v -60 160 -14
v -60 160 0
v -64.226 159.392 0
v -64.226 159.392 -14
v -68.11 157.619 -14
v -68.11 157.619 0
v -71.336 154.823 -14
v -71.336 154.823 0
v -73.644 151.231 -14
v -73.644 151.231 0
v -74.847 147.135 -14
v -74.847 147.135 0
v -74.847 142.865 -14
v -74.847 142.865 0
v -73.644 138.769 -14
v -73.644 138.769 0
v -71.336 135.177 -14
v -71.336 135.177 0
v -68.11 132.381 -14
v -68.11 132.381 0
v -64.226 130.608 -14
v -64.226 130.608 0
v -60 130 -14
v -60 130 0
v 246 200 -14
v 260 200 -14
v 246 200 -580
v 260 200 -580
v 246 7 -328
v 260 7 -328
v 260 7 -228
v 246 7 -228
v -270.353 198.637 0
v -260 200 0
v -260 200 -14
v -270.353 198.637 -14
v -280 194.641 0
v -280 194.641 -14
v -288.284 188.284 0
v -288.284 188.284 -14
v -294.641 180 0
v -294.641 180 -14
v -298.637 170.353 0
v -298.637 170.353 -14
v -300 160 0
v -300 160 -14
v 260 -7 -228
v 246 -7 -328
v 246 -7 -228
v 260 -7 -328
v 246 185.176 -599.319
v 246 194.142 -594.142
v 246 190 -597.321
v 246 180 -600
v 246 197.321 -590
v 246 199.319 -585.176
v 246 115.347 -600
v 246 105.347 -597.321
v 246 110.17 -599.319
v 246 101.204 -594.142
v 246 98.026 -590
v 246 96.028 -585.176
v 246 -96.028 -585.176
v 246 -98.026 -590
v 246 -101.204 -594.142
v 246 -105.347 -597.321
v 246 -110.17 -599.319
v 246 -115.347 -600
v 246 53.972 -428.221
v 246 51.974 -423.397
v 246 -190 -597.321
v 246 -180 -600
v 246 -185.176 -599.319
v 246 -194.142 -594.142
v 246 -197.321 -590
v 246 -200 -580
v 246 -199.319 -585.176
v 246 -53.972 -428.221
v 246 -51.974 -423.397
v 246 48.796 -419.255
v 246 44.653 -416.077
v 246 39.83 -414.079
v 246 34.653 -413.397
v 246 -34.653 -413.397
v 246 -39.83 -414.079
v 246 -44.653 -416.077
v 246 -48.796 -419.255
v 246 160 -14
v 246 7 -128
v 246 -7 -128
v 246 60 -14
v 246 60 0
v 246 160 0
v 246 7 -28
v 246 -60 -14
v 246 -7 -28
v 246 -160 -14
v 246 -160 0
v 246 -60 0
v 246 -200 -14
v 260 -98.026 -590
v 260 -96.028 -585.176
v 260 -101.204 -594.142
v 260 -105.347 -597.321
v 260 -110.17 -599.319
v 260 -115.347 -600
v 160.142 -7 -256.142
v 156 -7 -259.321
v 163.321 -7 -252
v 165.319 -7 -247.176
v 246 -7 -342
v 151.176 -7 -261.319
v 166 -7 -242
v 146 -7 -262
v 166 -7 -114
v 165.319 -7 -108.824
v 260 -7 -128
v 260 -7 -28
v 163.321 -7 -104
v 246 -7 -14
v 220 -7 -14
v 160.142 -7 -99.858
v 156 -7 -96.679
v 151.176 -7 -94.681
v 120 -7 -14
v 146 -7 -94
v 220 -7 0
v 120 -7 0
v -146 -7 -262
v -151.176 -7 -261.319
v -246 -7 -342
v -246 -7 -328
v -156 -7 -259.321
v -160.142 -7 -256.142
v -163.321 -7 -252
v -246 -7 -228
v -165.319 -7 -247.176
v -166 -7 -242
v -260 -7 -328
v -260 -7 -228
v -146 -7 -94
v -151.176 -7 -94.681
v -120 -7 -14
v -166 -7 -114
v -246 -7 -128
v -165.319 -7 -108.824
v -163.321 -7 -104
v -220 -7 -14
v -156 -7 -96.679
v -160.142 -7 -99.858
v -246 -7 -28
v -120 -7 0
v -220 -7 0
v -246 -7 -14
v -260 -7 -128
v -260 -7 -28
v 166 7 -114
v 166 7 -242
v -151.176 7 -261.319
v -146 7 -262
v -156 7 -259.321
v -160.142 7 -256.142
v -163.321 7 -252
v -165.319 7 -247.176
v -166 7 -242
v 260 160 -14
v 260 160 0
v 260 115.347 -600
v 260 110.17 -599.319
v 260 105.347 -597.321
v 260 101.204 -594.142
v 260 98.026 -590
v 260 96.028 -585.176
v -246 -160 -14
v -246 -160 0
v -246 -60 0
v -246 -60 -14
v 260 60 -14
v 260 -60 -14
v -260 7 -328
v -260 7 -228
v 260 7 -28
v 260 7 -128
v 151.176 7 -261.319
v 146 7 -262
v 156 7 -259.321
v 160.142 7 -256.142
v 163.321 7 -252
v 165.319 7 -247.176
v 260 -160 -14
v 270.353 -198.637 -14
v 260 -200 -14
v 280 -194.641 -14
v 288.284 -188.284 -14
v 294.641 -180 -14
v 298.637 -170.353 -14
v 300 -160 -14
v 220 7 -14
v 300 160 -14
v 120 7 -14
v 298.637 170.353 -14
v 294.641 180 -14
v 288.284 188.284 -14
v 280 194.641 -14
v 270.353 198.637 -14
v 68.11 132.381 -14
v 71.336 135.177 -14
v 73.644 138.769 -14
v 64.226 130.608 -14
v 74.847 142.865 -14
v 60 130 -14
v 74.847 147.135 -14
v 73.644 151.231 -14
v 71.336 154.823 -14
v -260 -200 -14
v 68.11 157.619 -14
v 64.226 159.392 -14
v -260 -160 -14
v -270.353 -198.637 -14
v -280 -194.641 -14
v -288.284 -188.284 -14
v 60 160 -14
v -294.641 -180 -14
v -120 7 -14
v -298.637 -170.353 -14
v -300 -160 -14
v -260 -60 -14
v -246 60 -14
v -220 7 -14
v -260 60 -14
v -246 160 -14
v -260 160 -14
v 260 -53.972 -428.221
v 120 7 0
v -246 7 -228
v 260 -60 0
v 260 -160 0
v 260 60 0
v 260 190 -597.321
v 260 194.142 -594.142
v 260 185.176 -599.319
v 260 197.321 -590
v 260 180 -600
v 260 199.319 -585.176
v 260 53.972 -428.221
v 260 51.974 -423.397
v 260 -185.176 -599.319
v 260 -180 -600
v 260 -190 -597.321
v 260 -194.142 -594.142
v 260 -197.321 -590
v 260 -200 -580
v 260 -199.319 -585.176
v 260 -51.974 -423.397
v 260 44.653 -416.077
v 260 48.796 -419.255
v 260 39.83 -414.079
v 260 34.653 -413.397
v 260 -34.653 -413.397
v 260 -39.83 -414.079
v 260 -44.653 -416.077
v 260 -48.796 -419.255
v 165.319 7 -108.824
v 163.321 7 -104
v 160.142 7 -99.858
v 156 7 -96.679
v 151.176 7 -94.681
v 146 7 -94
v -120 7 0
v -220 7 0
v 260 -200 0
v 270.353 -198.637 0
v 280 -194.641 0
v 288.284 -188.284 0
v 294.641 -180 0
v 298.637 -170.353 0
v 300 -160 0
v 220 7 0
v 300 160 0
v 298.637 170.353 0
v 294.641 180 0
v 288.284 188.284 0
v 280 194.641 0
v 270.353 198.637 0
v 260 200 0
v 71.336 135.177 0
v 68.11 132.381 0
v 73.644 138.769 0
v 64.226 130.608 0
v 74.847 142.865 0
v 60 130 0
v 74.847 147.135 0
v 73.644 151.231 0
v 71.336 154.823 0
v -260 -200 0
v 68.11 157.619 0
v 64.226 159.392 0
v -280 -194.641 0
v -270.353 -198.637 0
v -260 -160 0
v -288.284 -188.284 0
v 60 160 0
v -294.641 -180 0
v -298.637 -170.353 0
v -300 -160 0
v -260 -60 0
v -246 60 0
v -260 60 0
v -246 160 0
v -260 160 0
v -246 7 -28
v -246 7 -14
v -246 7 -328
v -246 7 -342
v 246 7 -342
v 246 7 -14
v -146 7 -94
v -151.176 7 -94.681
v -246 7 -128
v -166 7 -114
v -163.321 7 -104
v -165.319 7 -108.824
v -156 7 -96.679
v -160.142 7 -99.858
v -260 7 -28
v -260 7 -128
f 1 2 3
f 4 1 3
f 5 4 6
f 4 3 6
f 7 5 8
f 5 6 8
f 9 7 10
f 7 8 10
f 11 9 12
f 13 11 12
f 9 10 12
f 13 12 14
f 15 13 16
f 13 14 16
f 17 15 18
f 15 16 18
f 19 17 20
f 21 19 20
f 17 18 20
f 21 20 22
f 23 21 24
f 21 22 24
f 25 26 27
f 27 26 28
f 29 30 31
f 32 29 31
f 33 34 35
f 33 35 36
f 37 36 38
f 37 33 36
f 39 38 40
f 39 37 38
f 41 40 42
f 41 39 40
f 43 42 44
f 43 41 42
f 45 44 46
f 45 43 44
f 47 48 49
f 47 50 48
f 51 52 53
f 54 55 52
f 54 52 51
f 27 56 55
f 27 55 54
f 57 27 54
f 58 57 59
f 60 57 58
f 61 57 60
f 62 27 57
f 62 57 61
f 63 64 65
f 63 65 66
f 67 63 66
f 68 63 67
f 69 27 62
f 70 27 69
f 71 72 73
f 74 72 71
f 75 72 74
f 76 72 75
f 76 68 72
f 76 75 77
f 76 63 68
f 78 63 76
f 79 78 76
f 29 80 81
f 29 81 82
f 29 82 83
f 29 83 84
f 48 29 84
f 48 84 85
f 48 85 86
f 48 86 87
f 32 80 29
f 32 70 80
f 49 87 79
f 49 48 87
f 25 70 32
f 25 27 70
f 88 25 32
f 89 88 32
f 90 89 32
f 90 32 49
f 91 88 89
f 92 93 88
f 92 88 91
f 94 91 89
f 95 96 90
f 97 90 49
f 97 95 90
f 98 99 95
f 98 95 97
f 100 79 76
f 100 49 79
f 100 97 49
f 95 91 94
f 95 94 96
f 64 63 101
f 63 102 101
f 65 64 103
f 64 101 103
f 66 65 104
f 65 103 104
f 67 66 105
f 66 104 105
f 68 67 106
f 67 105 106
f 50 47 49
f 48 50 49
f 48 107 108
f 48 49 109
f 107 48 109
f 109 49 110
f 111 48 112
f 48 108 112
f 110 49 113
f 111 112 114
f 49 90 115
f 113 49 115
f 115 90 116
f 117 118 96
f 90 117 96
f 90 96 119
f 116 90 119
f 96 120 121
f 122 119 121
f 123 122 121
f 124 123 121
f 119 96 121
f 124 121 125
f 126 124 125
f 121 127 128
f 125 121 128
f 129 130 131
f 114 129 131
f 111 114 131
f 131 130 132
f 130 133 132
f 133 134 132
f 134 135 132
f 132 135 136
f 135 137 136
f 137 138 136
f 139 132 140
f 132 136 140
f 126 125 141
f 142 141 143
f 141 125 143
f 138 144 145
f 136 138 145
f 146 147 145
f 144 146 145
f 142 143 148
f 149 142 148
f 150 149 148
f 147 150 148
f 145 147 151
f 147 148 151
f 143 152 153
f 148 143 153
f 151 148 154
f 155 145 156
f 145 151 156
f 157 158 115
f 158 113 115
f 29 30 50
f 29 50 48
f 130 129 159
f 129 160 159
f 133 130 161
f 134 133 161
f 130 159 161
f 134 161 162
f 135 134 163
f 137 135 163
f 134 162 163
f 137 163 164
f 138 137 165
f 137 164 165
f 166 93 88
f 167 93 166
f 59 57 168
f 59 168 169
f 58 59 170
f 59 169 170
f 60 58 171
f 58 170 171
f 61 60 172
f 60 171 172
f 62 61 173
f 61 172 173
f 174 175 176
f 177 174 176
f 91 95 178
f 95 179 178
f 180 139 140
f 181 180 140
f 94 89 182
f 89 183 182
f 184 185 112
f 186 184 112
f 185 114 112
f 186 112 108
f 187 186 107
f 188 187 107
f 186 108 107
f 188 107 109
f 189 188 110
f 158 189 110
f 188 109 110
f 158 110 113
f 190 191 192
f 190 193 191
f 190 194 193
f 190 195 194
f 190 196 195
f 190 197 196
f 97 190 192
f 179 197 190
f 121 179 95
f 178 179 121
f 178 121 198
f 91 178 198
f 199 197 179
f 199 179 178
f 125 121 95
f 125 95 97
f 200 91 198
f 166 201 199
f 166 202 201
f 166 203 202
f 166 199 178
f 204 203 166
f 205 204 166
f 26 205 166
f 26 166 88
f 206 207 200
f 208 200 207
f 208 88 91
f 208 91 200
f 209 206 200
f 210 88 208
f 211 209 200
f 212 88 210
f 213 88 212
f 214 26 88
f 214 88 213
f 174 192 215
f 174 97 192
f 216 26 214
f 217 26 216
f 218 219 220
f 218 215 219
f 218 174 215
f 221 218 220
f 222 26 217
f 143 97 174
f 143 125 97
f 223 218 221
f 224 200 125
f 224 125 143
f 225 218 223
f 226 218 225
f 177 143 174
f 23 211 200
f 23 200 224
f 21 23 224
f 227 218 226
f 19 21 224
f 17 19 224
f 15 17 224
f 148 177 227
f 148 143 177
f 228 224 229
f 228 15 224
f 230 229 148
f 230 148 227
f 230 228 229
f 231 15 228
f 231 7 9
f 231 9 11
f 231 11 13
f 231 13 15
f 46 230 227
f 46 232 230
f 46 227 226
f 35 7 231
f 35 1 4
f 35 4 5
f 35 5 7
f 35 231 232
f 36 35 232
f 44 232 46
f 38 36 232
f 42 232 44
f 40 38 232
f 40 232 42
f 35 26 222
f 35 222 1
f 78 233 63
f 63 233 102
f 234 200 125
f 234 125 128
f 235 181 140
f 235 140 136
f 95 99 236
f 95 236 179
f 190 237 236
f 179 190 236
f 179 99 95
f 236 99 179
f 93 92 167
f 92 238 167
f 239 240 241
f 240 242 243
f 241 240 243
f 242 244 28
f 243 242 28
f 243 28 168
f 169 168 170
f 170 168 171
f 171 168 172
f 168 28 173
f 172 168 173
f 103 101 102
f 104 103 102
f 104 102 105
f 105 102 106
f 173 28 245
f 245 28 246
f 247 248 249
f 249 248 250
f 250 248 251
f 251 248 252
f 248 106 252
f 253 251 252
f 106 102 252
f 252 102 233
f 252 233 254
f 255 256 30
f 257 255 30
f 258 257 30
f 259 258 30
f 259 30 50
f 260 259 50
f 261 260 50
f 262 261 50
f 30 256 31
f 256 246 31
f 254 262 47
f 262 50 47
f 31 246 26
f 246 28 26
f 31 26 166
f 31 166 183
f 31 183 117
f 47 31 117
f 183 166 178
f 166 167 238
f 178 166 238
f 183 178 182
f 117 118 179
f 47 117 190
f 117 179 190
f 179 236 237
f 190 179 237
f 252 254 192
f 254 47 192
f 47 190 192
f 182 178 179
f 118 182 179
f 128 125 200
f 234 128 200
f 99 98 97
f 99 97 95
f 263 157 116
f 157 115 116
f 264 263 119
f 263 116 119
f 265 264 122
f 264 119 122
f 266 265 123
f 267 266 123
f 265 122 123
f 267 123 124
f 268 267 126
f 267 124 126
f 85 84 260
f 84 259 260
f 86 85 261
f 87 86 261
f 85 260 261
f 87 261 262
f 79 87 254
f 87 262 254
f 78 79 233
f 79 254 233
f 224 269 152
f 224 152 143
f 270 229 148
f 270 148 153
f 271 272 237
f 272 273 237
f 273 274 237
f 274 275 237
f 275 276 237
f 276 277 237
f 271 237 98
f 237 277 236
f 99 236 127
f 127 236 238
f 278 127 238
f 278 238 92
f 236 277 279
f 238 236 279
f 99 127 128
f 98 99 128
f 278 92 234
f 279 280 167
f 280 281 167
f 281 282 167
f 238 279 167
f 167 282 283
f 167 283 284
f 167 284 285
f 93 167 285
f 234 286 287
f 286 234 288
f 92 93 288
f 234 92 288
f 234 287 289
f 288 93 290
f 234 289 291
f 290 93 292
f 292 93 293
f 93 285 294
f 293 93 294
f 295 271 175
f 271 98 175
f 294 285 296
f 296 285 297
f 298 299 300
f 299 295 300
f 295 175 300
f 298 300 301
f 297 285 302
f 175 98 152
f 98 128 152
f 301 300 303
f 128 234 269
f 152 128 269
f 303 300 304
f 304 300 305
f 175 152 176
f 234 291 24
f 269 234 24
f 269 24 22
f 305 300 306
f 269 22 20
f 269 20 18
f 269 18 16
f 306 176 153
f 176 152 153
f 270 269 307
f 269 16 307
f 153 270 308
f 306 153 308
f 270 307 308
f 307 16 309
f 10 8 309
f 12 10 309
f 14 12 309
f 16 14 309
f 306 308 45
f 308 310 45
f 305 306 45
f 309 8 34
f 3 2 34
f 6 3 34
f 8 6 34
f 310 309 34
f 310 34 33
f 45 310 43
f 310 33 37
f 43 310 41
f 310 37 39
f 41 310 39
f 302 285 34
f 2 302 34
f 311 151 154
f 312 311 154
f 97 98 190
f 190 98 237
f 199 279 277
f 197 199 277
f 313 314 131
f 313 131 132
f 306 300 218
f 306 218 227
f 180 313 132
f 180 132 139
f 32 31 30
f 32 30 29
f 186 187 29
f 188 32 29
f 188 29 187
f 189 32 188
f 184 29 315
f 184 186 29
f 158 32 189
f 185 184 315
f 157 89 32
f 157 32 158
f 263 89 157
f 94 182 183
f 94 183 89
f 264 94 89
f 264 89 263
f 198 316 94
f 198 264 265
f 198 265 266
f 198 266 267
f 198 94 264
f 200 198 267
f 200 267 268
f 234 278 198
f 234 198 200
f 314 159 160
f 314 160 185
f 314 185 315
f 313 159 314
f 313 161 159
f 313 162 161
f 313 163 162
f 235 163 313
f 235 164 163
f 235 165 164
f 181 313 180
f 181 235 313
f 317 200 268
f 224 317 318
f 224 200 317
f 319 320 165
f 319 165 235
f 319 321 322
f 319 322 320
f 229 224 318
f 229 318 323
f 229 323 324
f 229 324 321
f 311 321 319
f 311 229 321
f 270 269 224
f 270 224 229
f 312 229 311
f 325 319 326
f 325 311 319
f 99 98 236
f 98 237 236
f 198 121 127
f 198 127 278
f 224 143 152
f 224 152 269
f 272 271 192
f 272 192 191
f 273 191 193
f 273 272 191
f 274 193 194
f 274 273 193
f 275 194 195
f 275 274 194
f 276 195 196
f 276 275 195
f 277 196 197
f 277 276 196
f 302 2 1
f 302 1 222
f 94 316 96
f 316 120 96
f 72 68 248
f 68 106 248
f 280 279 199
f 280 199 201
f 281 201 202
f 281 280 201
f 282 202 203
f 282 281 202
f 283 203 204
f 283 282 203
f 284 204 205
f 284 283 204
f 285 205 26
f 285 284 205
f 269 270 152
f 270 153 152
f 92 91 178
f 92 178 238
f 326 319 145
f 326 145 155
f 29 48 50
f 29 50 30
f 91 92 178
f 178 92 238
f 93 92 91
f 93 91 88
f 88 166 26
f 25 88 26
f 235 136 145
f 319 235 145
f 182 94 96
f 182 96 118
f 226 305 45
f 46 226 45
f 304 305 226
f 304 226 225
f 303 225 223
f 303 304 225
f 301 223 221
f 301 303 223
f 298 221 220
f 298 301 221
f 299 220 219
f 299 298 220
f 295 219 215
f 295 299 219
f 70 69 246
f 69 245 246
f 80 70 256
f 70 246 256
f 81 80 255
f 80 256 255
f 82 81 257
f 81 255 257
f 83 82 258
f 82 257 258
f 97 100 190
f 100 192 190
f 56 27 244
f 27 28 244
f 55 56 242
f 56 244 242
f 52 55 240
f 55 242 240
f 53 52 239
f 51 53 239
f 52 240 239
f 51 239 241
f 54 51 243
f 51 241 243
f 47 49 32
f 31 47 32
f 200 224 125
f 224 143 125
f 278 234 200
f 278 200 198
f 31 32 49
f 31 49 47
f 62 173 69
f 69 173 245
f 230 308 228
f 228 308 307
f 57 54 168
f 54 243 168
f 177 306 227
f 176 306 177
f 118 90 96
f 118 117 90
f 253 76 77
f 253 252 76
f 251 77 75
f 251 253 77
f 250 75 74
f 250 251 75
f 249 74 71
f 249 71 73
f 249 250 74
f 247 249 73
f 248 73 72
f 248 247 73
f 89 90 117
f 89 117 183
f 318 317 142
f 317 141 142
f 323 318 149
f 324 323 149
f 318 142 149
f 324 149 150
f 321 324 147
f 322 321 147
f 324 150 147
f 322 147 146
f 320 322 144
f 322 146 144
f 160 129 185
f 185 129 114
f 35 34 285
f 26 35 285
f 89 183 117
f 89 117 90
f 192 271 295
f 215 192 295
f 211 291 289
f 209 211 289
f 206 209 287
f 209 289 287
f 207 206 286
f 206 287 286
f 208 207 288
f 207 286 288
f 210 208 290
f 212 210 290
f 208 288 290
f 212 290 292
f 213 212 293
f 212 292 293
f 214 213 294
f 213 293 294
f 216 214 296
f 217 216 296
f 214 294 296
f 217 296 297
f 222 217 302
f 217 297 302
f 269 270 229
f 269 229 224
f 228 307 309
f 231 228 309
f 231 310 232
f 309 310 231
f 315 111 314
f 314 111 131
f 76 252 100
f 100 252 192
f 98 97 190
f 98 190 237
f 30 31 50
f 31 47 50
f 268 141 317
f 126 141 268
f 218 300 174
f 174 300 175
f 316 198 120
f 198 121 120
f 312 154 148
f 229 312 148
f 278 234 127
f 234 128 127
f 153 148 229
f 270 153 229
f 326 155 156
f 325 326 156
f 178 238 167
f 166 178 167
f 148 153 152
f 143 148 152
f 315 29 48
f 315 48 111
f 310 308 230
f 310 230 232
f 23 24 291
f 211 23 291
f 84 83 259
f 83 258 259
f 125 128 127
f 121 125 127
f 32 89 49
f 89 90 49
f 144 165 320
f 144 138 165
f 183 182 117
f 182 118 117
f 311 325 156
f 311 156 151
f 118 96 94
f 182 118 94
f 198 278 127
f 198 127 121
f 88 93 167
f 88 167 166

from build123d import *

# Parameters (mm, degrees)
SKETCH_W     = 14
SKETCH_H     = 100
SKETCH_W_2   = 100
SKETCH_H_2   = 14
PAD_DEPTH    = 14
SKETCH001_W  = 14
SKETCH001_H  = 100
PAD001_DEPTH = 7
FILLET_R     = 20
SKETCH002_W  = 332
SKETCH002_H  = 168
PAD002_DEPTH = 7
FILLET001_R  = 20


with BuildPart() as seat:
    # Sketch → Pad (new body)
    with BuildSketch(Plane.XY):
        with BuildLine():
            Line((-260, 200), (260, 200))
            ThreePointArc((300, 160), (288.284271, 188.284271), (260, 200))
            Line((300, 160), (300, -160))
            ThreePointArc((260, -200), (288.284271, -188.284271), (300, -160))
            Line((260, -200), (-260, -200))
            ThreePointArc((-300, -160), (-288.284271, -188.284271), (-260, -200))
            Line((-300, -160), (-300, 160))
            ThreePointArc((-260, 200), (-288.284271, 188.284271), (-300, 160))
        make_face()
        with BuildLine():
            ThreePointArc((-60, 160), (-75, 145), (-60, 130))
            Line((-60, 130), (60, 130))
            ThreePointArc((60, 130), (75, 145), (60, 160))
            Line((-60, 160), (60, 160))
        make_face(mode=Mode.SUBTRACT)
        with Locations((-253, 110)):
            Rectangle(SKETCH_W, SKETCH_H, mode=Mode.SUBTRACT)
        with Locations((-253, -110)):
            Rectangle(SKETCH_W, SKETCH_H, mode=Mode.SUBTRACT)
        with Locations((253, 110)):
            Rectangle(SKETCH_W, SKETCH_H, mode=Mode.SUBTRACT)
        with Locations((253, -110)):
            Rectangle(SKETCH_W, SKETCH_H, mode=Mode.SUBTRACT)
        with Locations((-170, 0)):
            Rectangle(SKETCH_W_2, SKETCH_H_2, mode=Mode.SUBTRACT)
        with Locations((170, 0)):
            Rectangle(SKETCH_W_2, SKETCH_H_2, mode=Mode.SUBTRACT)
    extrude(amount=-PAD_DEPTH)


with BuildPart() as body002:
    # Sketch001 → Pad001 (new body, symmetric)
    with BuildSketch(Plane.YZ):
        Polygon((-200, -600), (-200, -14), (-160, -14), (-160, 0), (-60, 0), (-60, -14), (60, -14), (60, 0), (160, 0), (160, -14), (200, -14), (200, -600), (100, -600), (50, -413.39746), (-50, -413.39746), (-100, -600), align=None)
        with Locations((0, -78)):
            Rectangle(SKETCH001_W, SKETCH001_H, mode=Mode.SUBTRACT)
        with Locations((0, -278)):
            Rectangle(SKETCH001_W, SKETCH001_H, mode=Mode.SUBTRACT)
    extrude(amount=PAD001_DEPTH, both=True)

    # Fillet
    fillet_edges = [body002.edges().sort_by_distance(p)[0] for p in [
        (0, 100, -600),
        (0, 200, -600),
        (0, 50, -413.39746),
        (0, -50, -413.39746),
        (0, -100, -600),
        (0, -200, -600),
    ]]
    fillet(fillet_edges, radius=FILLET_R)


with BuildPart() as body002_1:
    # Body001 placement: moved
    add(body002.part.moved(Location((-253, 0, 0))))


with BuildPart() as body002_2:
    # Clone placement: moved
    add(body002_1.part.moved(Location((253, 0, 0))))


with BuildPart() as body002_3:
    # Body002 placement: moved
    add(body002_2.part.moved(Location((253, 0, 0))))


with BuildPart() as structure:
    # Sketch002 → Pad002 (new body, symmetric)
    with BuildSketch(Plane.XZ):
        Polygon((-220, -14), (-220, 0), (-120, 0), (-120, -14), (120, -14), (120, 0), (220, 0), (220, -14), (246, -14), (246, -28), (260, -28), (260, -128), (246, -128), (246, -228), (260, -228), (260, -328), (246, -328), (246, -342), (-246, -342), (-246, -328), (-260, -328), (-260, -228), (-246, -228), (-246, -128), (-260, -128), (-260, -28), (-246, -28), (-246, -14), align=None)
        with Locations((0, -178)):
            Rectangle(SKETCH002_W, SKETCH002_H, mode=Mode.SUBTRACT)
    extrude(amount=PAD002_DEPTH, both=True)

    # Fillet001
    fillet001_edges = [structure.edges().sort_by_distance(p)[0] for p in [
        (-166, 0, -94),
        (166, 0, -94),
        (166, 0, -262),
        (-166, 0, -262),
    ]]
    fillet(fillet001_edges, radius=FILLET001_R)


solid = Compound([seat.part, body002_3.part, structure.part])
